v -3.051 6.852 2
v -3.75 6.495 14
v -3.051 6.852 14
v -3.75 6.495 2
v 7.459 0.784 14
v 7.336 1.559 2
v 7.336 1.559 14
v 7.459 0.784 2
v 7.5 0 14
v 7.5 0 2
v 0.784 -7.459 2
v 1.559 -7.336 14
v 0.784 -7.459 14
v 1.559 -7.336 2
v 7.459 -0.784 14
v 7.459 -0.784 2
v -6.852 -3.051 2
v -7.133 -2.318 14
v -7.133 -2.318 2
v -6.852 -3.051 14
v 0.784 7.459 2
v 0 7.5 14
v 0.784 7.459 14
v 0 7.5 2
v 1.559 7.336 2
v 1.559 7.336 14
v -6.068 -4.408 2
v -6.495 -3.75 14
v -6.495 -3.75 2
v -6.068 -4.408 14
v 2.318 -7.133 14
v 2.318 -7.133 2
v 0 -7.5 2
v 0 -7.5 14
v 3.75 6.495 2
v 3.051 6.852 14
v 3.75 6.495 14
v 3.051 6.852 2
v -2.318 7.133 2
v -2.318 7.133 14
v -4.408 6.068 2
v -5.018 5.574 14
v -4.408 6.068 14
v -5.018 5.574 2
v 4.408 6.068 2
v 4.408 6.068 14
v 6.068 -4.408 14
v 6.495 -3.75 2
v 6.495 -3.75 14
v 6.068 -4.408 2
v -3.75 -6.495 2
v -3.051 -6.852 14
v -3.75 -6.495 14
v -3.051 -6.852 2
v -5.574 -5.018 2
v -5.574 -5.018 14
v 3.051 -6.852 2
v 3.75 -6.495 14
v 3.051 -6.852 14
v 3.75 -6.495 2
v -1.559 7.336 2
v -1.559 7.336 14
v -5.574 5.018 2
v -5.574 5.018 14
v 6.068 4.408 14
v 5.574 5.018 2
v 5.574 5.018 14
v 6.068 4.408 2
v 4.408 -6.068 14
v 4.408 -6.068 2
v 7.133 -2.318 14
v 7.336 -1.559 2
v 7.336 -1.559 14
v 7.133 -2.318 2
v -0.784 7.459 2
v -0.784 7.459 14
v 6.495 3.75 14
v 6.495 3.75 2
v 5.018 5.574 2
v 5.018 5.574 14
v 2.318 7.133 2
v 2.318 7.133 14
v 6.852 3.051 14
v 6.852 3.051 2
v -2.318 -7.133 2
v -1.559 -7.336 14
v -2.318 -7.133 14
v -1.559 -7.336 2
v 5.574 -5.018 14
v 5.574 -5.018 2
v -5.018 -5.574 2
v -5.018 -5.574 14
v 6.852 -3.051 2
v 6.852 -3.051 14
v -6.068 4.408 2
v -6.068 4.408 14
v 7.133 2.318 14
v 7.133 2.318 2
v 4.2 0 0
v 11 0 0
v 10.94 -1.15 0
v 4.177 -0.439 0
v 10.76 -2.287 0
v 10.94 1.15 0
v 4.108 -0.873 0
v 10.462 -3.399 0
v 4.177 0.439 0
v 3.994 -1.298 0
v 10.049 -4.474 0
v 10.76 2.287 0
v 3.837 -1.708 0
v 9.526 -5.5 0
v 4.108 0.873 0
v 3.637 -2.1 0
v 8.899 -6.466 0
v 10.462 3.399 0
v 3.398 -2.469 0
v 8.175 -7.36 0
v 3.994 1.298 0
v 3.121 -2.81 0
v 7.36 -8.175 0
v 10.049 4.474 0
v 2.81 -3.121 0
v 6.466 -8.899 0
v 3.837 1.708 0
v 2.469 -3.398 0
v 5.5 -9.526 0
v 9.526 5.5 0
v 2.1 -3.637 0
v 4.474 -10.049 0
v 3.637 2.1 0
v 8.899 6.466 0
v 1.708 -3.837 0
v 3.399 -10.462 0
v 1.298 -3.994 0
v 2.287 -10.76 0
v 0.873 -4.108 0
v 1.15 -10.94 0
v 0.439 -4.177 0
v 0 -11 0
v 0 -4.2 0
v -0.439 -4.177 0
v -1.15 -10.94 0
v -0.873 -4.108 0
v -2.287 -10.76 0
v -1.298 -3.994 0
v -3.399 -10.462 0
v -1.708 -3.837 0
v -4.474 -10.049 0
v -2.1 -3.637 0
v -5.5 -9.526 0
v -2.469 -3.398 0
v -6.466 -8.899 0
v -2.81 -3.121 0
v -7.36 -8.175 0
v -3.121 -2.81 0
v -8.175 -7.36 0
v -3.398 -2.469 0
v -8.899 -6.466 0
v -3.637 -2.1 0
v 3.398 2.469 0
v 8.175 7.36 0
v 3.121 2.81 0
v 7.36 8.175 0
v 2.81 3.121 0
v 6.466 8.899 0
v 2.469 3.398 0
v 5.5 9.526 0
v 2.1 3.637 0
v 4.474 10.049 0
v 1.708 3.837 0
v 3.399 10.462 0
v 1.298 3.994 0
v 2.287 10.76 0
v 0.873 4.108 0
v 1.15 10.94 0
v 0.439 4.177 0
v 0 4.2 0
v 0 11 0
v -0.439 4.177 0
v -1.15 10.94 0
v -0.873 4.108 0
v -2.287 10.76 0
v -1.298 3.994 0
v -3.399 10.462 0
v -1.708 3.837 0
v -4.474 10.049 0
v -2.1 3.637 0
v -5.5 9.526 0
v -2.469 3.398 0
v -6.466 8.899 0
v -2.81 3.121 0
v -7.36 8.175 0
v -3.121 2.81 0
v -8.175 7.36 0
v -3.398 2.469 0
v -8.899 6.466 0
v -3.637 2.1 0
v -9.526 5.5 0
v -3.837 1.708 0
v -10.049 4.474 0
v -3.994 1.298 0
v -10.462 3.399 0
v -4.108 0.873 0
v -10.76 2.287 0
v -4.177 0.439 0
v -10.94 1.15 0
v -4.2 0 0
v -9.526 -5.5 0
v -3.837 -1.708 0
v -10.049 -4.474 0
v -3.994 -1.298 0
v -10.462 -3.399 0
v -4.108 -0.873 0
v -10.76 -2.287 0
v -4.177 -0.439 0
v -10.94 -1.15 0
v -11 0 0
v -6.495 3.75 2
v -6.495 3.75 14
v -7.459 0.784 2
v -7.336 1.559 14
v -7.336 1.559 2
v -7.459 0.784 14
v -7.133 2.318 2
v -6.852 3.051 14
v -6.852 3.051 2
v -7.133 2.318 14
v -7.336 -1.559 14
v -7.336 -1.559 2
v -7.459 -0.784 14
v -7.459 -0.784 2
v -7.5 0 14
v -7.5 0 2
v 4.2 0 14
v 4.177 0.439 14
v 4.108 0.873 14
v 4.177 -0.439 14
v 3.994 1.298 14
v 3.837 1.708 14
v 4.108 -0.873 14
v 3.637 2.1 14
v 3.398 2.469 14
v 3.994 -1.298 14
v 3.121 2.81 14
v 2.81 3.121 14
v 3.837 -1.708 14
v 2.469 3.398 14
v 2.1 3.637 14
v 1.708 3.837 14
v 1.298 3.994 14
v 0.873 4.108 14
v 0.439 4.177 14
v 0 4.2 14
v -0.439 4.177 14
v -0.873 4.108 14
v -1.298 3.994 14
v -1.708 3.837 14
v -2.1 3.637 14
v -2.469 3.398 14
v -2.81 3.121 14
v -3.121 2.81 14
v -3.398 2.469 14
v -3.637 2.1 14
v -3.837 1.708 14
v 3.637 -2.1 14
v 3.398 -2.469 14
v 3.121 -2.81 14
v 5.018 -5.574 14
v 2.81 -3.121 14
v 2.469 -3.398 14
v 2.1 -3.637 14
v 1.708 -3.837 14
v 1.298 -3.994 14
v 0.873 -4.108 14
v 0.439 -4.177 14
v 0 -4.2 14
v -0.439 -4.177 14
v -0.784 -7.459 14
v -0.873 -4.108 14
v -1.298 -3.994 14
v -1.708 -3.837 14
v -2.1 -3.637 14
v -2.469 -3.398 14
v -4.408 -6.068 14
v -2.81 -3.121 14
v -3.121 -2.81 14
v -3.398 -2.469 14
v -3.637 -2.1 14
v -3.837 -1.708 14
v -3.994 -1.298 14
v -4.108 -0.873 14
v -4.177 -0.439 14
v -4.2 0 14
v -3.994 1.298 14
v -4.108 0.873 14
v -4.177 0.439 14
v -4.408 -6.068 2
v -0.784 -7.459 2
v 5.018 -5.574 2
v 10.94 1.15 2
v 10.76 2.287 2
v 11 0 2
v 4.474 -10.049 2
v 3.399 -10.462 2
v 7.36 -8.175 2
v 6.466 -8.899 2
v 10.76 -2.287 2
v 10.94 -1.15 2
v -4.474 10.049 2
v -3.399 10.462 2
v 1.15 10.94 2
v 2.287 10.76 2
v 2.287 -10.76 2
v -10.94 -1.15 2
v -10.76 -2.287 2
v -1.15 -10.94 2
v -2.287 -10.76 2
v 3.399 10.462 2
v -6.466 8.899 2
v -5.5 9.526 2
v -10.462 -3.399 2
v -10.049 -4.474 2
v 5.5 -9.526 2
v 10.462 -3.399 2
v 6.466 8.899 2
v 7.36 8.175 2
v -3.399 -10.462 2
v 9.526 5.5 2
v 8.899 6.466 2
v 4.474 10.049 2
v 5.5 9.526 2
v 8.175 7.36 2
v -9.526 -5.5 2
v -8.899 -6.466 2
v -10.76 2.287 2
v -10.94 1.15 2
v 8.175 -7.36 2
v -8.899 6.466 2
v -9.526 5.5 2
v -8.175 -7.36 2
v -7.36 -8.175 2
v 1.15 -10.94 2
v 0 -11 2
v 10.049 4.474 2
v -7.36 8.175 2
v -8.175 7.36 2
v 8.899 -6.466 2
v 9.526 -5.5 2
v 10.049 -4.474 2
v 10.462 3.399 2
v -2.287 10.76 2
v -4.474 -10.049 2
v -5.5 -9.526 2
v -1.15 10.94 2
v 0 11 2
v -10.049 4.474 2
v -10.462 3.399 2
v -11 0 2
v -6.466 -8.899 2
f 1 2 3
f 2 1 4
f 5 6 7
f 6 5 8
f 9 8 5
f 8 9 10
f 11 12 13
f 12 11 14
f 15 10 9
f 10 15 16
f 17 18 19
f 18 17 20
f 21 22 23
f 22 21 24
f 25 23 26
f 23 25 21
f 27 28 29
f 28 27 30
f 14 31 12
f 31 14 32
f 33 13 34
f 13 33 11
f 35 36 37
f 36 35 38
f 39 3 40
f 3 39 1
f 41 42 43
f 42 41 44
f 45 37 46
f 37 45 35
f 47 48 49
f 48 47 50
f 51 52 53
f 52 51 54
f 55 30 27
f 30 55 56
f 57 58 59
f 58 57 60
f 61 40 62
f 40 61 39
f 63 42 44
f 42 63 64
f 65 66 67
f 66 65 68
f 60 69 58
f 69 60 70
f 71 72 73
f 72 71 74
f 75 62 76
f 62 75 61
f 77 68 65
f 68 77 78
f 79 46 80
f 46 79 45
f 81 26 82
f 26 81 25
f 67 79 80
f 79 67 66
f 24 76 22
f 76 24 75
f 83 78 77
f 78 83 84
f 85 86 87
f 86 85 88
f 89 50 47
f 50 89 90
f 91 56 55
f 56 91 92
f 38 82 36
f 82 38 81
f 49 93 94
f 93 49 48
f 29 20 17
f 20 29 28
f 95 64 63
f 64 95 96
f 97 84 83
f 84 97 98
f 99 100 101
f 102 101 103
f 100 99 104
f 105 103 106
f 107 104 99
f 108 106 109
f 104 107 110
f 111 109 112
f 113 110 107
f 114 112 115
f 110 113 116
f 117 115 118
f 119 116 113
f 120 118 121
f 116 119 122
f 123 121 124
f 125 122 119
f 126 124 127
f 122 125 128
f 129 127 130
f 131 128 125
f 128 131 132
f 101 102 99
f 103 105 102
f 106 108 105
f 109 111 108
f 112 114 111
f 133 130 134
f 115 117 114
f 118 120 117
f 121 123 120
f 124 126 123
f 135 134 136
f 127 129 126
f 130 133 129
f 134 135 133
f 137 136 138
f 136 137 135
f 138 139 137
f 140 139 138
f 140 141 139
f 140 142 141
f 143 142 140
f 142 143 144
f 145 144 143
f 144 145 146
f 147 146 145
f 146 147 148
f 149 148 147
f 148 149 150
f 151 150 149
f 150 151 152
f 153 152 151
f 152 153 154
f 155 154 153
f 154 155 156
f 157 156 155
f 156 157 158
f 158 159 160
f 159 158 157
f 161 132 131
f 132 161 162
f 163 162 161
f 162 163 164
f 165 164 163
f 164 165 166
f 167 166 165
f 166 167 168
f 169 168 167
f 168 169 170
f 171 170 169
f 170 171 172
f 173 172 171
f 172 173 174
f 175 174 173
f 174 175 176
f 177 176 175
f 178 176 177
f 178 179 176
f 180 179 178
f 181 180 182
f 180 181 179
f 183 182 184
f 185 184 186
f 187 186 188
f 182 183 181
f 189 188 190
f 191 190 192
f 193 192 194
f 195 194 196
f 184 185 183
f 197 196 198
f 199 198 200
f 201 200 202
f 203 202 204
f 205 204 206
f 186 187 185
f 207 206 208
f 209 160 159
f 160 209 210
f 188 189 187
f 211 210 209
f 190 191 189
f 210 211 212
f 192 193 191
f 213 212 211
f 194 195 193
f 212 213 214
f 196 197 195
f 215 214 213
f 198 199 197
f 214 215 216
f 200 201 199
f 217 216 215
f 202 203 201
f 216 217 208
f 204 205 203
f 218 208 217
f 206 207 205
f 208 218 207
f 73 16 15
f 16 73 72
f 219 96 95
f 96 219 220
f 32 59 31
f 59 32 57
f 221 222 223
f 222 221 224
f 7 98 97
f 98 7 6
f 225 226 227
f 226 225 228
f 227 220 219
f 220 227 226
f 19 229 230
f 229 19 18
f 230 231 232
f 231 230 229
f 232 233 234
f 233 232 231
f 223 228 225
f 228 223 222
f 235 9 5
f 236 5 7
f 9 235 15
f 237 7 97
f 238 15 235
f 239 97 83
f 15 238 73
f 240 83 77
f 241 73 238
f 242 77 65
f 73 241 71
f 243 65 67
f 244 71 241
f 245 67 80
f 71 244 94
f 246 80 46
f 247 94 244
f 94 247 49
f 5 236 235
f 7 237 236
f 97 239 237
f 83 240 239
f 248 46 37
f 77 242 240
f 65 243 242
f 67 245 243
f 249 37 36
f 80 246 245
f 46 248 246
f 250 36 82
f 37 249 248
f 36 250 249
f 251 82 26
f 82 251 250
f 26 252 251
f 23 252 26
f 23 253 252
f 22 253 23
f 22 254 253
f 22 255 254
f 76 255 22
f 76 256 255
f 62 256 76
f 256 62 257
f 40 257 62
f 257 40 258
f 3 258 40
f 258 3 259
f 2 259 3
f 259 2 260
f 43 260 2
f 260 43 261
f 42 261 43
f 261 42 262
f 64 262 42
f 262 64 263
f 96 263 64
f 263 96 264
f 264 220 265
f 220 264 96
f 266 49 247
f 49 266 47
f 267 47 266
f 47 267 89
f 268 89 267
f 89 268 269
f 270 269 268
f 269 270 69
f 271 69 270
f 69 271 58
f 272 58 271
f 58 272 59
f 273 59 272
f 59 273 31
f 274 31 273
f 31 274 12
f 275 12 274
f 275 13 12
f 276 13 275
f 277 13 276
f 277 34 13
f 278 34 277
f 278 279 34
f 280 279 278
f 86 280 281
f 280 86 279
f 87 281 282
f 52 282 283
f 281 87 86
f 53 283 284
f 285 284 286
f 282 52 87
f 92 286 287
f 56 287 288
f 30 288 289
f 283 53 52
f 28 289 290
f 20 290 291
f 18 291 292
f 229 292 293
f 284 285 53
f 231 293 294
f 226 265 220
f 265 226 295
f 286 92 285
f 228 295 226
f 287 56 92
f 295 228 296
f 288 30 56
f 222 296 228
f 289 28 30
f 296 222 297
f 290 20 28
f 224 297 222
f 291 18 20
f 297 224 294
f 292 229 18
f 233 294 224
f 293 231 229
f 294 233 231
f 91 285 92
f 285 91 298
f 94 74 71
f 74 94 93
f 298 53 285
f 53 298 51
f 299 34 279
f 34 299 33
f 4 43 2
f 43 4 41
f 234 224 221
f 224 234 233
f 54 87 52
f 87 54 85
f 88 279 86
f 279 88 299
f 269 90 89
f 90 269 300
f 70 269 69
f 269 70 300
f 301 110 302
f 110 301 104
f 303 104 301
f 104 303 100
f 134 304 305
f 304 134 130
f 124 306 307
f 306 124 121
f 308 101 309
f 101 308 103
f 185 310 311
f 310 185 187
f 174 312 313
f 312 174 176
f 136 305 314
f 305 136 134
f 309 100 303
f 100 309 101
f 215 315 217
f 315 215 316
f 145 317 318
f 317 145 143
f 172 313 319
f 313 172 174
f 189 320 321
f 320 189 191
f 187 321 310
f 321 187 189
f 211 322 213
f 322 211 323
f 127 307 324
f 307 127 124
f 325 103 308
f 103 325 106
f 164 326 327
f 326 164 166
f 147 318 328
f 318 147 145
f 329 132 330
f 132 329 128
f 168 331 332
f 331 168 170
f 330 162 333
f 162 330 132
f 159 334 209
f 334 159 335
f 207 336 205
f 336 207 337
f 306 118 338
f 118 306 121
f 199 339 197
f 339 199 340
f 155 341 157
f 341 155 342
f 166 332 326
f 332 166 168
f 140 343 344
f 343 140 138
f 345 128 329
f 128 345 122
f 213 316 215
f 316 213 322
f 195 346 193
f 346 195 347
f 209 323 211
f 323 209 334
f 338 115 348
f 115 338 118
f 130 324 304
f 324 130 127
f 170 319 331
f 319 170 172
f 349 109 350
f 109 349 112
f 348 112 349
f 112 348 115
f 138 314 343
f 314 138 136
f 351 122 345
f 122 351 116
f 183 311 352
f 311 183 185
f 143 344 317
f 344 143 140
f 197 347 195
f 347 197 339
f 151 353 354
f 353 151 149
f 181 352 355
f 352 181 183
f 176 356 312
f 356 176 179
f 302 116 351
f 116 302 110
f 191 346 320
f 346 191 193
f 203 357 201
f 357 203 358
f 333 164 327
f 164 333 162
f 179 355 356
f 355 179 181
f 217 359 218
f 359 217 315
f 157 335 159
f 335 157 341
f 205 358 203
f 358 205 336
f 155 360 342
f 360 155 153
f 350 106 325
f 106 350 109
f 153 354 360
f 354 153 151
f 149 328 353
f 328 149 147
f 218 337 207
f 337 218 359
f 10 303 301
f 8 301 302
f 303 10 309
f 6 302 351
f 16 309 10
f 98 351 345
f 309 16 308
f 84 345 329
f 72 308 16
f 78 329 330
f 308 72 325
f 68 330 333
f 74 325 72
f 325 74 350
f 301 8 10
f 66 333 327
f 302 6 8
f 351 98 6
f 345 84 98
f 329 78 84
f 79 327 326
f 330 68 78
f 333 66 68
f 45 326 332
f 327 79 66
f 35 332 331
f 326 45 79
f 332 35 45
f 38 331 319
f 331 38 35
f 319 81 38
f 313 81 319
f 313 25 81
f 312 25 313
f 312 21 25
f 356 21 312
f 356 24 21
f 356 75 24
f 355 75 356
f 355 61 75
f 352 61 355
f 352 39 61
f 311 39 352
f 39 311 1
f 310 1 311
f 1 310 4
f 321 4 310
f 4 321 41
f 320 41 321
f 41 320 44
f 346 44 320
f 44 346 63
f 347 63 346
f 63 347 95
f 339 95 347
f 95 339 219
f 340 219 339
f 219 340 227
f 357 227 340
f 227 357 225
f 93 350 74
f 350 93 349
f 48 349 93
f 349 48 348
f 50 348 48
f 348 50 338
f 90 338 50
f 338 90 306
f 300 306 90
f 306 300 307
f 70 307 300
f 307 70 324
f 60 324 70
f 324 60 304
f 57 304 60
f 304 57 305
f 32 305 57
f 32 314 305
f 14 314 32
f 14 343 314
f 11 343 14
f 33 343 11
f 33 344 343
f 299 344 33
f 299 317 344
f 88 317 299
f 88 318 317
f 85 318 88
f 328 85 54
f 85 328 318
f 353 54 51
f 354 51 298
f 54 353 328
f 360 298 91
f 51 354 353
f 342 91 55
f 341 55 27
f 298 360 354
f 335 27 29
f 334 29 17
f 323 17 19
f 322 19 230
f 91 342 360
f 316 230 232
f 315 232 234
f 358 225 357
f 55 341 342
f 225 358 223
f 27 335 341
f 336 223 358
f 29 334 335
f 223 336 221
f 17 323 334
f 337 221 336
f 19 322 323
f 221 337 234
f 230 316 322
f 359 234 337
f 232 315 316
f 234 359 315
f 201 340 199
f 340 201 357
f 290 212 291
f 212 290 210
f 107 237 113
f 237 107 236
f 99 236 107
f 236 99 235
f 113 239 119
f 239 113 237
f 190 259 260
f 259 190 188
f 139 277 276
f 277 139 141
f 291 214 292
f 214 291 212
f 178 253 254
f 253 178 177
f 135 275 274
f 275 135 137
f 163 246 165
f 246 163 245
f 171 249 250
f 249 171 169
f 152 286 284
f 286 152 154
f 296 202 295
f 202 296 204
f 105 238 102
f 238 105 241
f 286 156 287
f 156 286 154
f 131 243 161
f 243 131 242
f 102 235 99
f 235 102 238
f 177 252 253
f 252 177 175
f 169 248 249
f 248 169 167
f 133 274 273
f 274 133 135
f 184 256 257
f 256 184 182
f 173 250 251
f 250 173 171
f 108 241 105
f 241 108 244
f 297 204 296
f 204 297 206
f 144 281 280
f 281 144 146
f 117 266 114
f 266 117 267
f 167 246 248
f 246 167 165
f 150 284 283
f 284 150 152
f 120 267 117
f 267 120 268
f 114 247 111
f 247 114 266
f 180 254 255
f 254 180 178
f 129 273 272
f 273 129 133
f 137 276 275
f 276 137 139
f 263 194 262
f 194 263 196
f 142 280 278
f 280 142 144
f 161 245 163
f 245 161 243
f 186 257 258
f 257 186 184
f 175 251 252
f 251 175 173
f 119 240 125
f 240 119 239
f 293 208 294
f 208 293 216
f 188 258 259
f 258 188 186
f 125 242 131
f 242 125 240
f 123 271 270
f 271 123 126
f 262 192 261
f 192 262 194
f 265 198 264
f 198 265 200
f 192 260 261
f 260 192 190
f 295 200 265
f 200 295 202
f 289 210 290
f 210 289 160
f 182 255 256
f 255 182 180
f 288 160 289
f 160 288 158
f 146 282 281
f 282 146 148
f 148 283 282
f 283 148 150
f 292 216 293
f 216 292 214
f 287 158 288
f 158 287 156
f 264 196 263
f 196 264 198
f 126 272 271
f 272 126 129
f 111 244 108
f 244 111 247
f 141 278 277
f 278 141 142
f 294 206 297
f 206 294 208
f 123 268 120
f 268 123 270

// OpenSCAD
// Rivet nut / nutsert.
$fn = 60;
eps = 0.02;
thread_d = 8.4;
outer_d = 15;
length = 14;
flange_d = 22;
difference() { union() { cylinder(d=max(outer_d, thread_d+3),h=length); cylinder(d=max(flange_d, thread_d+6),h=2); } translate([0,0,-eps]) cylinder(d=thread_d,h=length+2*eps); }
